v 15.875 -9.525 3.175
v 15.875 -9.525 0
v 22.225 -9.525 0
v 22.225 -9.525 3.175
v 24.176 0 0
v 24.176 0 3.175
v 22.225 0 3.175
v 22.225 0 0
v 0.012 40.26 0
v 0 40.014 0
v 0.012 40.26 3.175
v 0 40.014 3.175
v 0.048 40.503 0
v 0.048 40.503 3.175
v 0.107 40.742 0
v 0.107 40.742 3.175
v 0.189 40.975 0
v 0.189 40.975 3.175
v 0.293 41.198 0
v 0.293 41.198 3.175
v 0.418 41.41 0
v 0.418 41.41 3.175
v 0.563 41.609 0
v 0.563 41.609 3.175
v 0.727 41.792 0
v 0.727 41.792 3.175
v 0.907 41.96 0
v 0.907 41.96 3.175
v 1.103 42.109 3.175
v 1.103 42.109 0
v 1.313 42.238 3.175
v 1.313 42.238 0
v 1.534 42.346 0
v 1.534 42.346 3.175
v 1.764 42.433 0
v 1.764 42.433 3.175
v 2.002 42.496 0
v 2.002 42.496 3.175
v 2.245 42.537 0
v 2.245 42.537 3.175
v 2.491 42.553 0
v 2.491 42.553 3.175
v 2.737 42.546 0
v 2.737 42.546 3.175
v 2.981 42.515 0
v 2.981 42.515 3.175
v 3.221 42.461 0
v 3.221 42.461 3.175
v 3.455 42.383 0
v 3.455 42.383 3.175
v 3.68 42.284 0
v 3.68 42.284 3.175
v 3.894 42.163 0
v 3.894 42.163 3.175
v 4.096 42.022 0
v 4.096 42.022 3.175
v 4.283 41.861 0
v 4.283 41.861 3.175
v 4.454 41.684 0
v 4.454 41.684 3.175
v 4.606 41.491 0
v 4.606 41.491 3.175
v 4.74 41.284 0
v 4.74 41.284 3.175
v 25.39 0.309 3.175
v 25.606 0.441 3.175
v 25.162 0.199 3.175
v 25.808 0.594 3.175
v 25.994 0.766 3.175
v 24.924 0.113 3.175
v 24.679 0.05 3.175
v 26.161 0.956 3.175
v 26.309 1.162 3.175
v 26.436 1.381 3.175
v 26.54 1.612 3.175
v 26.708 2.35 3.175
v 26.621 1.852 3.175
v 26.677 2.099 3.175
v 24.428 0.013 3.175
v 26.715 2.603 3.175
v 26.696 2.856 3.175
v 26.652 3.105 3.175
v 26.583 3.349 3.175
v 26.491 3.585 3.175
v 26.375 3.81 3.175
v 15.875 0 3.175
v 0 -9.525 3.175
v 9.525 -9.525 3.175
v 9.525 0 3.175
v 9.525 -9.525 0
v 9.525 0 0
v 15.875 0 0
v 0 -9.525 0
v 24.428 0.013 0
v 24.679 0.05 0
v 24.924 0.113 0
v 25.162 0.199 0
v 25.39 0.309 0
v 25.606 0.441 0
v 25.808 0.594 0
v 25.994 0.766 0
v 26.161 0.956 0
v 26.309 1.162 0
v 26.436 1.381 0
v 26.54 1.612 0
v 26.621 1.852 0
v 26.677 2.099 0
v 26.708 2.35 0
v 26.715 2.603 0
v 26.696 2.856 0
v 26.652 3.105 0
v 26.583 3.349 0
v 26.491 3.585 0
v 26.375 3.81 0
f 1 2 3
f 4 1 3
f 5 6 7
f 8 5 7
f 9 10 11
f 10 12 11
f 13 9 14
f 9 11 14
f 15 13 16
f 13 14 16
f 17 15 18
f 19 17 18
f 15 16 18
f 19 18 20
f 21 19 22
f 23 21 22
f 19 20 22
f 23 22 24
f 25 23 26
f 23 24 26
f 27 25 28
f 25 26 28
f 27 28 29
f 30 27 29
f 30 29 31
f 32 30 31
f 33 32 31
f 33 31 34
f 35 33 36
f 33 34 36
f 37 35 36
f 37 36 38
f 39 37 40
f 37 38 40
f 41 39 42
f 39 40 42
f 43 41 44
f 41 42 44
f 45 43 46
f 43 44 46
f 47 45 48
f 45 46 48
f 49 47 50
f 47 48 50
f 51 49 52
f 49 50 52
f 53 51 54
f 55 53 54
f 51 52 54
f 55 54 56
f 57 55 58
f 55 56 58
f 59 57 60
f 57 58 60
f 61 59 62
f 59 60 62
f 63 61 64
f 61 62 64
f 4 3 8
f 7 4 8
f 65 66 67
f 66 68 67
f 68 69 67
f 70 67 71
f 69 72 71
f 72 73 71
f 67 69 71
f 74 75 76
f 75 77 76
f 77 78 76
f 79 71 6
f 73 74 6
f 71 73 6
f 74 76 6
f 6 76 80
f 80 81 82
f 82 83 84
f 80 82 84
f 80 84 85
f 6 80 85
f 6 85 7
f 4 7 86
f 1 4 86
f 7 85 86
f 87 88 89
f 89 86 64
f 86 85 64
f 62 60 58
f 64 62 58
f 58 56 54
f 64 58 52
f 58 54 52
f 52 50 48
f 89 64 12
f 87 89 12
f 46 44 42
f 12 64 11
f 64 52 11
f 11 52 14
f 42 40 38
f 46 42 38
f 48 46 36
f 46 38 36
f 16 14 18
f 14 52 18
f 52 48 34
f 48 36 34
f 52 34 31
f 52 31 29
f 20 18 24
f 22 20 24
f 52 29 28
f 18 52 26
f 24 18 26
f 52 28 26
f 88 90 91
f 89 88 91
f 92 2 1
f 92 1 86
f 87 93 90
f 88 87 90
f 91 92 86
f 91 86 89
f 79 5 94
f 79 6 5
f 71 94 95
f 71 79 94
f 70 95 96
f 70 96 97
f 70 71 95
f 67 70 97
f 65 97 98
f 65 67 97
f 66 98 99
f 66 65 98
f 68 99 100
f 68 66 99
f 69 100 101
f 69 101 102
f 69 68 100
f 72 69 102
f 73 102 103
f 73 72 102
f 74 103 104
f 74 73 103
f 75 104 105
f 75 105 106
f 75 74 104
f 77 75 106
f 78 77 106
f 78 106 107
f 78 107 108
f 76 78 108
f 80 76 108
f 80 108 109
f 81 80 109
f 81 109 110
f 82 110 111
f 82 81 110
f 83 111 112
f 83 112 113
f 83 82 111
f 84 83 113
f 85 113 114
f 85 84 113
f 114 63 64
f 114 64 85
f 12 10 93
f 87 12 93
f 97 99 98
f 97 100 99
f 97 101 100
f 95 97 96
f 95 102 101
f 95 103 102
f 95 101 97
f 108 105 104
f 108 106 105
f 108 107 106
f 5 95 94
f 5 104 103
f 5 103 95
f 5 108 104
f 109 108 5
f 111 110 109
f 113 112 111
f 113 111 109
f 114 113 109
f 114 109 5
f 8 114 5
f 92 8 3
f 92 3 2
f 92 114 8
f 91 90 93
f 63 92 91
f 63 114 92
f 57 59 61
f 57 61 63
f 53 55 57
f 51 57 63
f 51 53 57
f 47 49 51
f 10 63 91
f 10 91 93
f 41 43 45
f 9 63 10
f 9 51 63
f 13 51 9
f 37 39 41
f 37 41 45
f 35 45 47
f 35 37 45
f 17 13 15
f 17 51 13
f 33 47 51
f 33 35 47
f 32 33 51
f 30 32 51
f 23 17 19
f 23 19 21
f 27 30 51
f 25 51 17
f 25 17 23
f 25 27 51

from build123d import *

# Parameters (mm, degrees)
SKETCH1_W           = 9.525
SKETCH1_H           = 9.525
SKETCH1_W_2         = 6.35
BOSS_EXTRUDE1_DEPTH = 3.175
FILLET1_R           = 2.54


with BuildPart() as part:
    # Sketch1 → Boss-Extrude1 (new body)
    with BuildSketch(Plane.XY):
        Polygon((28.575, 0), (0, 0), (0, 49.493351826), align=None)
        with Locations((4.7625, -4.7625)):
            Rectangle(SKETCH1_W, SKETCH1_H)
        with Locations((19.05, -4.7625)):
            Rectangle(SKETCH1_W_2, SKETCH1_H)
    extrude(amount=BOSS_EXTRUDE1_DEPTH)

    # Fillet1
    fillet1_edges = [part.edges().sort_by_distance(p)[0] for p in [
        (0, 49.493351826, 1.5875),
        (28.575, 0, 1.5875),
    ]]
    fillet(fillet1_edges, radius=FILLET1_R)


solid = part.part
